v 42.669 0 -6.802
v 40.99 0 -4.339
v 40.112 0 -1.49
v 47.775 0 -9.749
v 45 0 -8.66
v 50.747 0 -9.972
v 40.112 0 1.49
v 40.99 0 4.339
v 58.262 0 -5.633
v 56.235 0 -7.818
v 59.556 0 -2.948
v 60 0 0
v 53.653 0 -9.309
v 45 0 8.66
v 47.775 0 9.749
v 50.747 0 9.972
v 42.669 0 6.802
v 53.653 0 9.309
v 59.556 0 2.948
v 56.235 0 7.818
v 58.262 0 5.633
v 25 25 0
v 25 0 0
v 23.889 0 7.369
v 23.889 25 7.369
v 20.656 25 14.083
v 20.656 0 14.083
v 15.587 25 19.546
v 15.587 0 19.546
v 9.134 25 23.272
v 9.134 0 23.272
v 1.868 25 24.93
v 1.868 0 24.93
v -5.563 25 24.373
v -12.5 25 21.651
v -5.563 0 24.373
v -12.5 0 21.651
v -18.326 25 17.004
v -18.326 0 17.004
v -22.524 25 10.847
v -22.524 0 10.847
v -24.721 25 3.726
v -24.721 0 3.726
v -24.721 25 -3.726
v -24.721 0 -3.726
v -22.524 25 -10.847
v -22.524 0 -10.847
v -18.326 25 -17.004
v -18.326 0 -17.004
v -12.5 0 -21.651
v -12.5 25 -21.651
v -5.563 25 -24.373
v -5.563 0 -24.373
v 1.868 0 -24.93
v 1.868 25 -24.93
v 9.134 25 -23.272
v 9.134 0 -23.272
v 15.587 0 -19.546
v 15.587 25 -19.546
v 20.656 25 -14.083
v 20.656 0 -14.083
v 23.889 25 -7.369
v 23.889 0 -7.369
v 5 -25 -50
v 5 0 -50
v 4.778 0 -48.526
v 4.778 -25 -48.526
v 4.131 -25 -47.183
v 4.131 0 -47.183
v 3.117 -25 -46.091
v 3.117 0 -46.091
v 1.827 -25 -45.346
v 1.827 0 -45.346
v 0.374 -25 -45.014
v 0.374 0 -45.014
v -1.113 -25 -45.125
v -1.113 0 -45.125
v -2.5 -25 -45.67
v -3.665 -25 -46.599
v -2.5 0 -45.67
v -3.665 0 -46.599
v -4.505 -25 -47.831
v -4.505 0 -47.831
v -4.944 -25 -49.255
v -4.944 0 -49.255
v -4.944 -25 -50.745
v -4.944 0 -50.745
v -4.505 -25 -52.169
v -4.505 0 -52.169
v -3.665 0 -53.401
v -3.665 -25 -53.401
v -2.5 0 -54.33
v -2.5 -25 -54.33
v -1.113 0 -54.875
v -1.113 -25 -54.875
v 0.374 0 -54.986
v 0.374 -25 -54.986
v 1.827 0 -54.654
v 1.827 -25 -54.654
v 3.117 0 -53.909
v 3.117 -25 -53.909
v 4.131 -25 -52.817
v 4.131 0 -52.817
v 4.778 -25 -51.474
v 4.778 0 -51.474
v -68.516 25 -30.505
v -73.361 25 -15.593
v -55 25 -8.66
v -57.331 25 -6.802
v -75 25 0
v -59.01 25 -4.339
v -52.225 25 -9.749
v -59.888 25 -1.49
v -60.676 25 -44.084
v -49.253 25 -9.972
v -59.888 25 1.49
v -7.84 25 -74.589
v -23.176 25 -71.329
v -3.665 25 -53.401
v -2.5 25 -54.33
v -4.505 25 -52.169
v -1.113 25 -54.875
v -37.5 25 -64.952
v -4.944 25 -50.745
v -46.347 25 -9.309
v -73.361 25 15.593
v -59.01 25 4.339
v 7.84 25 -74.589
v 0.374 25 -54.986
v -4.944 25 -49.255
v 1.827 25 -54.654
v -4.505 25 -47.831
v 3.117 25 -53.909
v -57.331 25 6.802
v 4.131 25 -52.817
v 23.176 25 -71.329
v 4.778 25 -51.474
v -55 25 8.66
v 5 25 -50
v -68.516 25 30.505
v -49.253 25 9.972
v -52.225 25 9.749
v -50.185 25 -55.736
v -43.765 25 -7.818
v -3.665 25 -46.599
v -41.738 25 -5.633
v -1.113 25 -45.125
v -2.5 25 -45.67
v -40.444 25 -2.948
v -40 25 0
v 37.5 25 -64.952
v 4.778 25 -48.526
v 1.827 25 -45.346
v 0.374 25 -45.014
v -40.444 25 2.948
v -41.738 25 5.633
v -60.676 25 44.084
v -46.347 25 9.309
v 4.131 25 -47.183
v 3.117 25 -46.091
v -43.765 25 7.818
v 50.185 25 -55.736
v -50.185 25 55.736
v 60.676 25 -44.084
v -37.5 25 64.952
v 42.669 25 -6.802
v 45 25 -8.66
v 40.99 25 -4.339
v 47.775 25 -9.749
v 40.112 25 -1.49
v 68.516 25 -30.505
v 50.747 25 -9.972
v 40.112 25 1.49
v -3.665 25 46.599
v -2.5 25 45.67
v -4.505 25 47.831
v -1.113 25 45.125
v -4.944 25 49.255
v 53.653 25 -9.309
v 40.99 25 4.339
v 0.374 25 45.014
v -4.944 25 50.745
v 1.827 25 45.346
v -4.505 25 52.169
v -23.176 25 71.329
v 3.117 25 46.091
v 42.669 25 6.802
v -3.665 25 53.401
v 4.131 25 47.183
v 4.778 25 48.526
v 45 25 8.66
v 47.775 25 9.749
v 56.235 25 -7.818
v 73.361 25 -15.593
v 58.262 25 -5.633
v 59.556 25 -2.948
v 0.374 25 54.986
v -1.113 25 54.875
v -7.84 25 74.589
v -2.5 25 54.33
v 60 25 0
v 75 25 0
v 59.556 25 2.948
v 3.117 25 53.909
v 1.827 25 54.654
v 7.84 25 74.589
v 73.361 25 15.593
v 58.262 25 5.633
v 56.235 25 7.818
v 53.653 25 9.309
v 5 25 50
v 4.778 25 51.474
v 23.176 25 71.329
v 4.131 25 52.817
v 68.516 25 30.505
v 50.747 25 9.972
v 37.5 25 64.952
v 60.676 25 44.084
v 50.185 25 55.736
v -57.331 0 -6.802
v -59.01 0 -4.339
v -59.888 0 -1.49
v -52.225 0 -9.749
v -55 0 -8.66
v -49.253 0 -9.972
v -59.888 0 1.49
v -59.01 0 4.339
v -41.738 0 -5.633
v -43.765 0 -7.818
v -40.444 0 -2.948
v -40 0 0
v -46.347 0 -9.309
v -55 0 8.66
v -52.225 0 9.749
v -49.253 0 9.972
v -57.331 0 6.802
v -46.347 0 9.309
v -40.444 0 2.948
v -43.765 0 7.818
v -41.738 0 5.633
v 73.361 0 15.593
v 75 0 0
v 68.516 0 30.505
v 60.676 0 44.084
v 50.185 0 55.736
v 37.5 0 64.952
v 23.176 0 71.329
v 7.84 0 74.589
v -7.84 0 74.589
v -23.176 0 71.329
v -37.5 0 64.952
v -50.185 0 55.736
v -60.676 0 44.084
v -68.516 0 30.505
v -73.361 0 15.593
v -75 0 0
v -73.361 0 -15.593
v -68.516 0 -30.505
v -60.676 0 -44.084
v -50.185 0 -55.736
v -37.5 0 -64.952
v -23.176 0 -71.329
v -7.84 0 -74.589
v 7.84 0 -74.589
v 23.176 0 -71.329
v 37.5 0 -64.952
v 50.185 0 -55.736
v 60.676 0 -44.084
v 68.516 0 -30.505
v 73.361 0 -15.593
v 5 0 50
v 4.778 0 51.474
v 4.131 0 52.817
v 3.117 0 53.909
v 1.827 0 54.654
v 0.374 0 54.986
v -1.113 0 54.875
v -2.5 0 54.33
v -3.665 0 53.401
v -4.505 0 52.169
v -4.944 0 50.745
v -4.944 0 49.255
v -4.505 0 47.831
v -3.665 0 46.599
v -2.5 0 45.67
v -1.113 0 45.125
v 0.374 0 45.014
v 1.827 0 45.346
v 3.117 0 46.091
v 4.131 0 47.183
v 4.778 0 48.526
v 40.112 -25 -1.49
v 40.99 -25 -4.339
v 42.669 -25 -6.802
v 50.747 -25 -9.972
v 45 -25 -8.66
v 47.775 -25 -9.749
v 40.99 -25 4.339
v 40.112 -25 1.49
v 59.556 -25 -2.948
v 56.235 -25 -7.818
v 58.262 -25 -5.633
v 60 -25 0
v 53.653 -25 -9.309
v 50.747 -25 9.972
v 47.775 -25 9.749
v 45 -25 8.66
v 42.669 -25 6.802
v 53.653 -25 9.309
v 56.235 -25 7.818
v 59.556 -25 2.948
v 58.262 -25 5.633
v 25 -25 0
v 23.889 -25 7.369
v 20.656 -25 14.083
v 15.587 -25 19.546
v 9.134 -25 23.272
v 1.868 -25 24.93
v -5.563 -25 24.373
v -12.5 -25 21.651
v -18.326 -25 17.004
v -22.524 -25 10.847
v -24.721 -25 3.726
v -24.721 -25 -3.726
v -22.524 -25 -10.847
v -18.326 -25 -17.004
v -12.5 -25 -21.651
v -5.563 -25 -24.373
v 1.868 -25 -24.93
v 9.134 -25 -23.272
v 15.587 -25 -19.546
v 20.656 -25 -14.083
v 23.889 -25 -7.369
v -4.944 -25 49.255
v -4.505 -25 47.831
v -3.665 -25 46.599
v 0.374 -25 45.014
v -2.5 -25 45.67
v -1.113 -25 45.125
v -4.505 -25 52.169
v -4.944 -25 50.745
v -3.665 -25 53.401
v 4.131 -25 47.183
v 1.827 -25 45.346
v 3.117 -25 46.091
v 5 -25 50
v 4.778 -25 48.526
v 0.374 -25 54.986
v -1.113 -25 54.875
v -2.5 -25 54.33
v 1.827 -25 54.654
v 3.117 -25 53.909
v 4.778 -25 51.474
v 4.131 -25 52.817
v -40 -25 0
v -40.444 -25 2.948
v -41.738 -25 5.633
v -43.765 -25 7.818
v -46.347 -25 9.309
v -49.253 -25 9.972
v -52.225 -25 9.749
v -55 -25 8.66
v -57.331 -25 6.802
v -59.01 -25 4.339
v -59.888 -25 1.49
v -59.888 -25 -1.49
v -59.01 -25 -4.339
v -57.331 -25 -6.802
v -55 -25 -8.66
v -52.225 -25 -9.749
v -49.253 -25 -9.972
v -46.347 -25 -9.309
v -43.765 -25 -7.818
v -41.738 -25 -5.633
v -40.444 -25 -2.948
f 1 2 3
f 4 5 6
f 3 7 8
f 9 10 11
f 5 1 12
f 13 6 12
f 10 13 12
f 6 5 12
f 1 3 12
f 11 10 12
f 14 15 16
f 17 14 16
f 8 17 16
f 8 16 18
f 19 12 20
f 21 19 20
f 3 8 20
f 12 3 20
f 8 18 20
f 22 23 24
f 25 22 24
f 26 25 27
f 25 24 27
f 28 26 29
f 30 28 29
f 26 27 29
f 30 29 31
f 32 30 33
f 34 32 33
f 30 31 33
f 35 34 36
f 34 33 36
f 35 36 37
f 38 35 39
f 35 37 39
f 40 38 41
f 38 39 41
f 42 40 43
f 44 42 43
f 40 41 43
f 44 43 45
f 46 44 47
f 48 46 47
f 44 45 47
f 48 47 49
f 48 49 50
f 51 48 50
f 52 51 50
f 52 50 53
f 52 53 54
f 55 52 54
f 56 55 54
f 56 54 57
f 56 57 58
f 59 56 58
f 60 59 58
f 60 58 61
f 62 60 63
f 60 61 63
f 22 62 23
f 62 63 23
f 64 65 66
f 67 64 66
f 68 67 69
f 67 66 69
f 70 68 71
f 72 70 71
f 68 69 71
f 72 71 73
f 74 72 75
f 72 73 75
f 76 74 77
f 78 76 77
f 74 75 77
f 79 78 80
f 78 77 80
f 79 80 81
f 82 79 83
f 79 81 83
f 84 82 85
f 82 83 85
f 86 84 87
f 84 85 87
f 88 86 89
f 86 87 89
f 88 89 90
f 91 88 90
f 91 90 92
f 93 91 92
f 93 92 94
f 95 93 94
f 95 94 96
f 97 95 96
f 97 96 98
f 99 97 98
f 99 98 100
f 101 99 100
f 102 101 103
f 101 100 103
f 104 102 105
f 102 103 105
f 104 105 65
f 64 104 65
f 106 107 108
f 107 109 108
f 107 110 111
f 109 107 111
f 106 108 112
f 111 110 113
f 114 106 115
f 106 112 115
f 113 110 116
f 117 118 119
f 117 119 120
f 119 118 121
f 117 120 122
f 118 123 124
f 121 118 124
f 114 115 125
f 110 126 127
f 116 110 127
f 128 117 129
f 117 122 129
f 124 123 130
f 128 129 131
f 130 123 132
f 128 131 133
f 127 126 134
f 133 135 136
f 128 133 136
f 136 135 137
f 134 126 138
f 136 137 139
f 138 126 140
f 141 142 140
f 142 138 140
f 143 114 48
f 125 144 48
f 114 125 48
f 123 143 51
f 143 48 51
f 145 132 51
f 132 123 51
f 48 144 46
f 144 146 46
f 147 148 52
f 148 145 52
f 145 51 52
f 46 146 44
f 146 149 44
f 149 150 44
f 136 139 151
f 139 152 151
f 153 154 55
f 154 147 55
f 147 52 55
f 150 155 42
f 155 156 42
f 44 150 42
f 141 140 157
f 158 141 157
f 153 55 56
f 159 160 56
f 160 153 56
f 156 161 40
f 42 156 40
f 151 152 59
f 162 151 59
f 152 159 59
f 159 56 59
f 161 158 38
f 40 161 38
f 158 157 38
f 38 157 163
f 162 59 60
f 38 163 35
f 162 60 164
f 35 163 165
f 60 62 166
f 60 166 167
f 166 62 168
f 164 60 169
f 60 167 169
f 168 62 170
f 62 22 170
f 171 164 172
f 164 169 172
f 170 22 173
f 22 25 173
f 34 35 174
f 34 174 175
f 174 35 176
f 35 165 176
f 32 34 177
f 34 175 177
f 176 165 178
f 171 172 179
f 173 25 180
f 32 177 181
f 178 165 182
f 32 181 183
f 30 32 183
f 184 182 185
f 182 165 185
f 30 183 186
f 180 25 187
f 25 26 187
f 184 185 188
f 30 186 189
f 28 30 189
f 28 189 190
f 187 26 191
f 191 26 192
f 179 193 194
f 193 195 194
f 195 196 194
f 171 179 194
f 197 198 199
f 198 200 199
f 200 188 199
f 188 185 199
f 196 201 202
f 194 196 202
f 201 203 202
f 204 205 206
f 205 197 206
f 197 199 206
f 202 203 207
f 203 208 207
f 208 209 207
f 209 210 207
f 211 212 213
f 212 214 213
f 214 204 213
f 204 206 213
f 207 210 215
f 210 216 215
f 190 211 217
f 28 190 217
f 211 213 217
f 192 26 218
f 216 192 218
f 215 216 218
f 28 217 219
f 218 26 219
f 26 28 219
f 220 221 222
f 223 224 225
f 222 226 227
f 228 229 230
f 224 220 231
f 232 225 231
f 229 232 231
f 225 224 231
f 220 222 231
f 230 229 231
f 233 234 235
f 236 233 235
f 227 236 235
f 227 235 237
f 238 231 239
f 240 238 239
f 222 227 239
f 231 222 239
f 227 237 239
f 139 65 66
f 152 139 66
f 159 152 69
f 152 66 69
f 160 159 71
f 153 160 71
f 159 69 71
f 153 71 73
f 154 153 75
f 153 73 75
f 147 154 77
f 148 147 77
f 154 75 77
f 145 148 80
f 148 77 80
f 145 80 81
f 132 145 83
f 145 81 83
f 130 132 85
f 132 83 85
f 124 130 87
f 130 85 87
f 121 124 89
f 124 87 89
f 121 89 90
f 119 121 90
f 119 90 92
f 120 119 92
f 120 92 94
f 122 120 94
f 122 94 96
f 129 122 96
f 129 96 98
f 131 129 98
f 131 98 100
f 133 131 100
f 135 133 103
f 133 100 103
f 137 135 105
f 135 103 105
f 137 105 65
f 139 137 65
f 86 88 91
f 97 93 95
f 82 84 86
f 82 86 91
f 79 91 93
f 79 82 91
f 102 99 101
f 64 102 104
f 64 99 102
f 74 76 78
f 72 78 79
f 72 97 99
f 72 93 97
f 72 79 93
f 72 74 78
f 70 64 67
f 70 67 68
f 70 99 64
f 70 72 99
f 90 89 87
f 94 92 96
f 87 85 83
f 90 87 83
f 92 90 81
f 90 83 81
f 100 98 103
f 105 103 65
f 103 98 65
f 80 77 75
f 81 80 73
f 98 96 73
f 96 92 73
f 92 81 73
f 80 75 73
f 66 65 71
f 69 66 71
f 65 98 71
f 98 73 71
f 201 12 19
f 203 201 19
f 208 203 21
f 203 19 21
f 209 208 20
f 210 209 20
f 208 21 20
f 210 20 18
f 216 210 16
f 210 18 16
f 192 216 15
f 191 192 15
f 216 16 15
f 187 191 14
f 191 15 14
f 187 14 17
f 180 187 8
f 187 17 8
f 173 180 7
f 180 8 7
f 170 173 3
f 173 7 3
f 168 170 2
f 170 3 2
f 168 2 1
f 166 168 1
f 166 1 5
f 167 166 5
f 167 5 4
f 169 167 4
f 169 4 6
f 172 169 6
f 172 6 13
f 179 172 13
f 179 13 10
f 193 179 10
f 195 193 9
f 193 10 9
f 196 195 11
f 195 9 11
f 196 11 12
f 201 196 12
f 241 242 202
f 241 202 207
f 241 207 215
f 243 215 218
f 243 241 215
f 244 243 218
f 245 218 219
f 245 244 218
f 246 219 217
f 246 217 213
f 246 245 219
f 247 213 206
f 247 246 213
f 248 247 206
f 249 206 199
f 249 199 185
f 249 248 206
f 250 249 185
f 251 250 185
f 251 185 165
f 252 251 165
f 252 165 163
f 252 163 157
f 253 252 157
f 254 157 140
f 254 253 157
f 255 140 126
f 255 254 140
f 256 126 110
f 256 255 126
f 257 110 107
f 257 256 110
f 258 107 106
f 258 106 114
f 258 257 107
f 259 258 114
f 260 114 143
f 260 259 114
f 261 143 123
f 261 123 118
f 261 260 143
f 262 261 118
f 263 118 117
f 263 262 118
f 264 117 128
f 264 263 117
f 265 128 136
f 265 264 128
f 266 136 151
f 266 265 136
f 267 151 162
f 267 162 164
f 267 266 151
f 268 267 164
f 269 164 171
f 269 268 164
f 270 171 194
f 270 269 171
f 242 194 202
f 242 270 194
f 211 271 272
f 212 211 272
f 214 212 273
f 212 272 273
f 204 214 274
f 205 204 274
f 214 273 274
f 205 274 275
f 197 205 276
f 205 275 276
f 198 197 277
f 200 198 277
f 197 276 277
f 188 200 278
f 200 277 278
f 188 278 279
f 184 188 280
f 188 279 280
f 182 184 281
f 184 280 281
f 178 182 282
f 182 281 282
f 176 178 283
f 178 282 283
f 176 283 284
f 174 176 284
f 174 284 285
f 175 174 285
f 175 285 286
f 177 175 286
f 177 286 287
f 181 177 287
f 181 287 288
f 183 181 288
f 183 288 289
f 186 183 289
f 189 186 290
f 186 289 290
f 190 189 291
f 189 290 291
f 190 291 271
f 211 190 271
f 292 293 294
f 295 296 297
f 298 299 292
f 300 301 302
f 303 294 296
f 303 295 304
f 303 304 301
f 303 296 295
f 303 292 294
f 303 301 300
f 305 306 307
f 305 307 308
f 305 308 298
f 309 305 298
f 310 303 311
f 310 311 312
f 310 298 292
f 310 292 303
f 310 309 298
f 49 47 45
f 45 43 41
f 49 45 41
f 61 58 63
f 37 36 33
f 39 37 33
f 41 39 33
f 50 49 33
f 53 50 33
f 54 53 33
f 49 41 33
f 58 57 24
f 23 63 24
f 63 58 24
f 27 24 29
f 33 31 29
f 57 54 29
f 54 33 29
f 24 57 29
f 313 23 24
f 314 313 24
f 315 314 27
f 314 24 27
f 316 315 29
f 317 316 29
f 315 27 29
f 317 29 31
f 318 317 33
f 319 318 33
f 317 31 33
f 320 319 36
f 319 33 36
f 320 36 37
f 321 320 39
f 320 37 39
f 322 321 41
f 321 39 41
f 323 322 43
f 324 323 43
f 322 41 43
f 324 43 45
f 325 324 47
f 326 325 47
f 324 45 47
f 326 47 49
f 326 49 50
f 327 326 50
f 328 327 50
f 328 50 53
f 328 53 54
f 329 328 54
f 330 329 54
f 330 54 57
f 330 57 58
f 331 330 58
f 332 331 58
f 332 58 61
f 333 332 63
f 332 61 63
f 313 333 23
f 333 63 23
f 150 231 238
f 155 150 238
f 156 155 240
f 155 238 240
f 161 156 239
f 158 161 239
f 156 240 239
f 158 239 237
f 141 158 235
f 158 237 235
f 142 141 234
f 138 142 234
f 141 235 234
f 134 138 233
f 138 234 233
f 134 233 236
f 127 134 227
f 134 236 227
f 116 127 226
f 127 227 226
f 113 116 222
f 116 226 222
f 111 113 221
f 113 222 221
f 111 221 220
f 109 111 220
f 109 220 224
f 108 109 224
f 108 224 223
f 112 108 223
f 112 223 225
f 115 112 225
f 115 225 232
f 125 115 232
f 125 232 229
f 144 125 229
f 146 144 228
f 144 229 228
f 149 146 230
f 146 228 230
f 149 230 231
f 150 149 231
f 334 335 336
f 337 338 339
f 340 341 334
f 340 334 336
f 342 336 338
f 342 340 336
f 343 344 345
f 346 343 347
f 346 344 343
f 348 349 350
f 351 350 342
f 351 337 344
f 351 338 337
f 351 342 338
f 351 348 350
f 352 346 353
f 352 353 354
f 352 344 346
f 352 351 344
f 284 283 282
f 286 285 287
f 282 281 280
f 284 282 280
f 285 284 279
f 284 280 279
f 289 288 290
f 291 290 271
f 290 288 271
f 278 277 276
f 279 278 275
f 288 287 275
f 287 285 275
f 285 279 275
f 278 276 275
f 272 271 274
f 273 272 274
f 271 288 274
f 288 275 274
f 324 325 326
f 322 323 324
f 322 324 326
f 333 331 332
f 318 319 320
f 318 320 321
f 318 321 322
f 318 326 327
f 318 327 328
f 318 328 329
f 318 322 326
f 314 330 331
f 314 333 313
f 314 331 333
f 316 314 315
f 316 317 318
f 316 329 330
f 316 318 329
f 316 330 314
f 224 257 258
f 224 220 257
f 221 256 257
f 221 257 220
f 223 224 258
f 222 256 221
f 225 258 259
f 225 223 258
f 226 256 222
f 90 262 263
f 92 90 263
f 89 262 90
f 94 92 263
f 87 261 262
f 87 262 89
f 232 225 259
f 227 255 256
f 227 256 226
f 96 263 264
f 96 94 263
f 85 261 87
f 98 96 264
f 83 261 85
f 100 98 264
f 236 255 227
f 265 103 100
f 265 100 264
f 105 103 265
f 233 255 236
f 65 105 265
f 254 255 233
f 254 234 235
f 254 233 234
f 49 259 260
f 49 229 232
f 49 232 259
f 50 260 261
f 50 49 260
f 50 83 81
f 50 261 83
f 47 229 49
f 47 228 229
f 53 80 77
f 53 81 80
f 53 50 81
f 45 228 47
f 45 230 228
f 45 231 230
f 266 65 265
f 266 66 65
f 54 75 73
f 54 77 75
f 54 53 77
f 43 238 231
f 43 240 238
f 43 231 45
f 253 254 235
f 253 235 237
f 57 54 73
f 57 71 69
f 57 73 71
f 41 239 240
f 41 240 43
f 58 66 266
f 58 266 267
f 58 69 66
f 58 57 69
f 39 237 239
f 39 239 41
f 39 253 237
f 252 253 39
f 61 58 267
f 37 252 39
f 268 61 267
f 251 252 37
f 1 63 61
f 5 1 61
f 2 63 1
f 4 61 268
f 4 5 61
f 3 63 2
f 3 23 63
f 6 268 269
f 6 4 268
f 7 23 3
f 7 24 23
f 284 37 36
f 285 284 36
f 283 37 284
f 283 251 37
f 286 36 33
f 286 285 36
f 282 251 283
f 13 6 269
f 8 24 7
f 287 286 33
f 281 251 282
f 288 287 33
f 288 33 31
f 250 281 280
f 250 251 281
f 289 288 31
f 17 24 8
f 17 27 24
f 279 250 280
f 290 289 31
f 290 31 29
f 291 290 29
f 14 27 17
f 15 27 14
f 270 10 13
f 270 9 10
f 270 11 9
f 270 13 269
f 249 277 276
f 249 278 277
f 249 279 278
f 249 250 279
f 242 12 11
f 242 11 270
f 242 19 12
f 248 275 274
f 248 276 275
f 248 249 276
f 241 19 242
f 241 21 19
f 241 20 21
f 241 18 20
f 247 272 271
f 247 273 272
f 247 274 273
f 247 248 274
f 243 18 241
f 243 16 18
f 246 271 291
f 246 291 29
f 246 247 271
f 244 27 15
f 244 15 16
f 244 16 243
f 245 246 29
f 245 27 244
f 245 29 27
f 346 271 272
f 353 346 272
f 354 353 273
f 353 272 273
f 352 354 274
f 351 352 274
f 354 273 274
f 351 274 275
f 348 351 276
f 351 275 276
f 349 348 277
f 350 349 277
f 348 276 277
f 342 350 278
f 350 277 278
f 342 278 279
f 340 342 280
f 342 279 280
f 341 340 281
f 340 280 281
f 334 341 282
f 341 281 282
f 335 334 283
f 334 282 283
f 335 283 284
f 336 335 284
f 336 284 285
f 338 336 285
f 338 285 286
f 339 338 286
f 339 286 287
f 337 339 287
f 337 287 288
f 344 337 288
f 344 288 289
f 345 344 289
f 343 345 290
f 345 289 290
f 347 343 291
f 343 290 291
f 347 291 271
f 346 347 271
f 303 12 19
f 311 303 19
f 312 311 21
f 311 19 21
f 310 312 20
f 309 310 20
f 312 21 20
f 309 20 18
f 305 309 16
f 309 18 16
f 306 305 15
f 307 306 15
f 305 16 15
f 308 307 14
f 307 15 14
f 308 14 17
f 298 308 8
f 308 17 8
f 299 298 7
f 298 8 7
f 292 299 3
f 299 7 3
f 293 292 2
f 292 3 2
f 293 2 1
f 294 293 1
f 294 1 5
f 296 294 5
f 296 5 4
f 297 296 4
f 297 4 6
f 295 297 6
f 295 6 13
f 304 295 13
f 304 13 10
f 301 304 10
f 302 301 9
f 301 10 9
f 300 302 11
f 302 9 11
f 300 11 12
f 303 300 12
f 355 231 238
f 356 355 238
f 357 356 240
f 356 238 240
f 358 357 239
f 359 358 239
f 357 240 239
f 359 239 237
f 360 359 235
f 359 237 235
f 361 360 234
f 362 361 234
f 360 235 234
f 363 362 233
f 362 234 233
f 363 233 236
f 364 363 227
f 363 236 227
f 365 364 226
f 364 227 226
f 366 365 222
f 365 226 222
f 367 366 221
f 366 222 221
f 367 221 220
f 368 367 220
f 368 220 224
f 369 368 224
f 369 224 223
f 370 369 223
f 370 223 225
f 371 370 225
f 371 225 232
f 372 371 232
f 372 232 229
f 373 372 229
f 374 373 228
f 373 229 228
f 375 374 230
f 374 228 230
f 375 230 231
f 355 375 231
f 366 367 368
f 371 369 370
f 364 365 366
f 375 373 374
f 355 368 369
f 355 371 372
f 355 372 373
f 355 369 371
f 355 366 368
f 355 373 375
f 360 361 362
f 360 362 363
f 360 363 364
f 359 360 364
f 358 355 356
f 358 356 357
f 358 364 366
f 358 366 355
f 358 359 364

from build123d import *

# Parameters (mm, degrees)
F0_R     = 10
F0_R_2   = 5
F0_R_3   = 25
F1_DEPTH = 25
F0_R_4   = 75
F2_DEPTH = 25


with BuildPart() as f1:
    # F0 (on Front) → F1 (new body)
    with BuildSketch(Plane.XZ):
        with Locations((-50, 0)):
            Circle(F0_R)
        with Locations((0, 50)):
            Circle(F0_R_2)
        with Locations((50, 0)):
            Circle(F0_R)
        with Locations((0, -50)):
            Circle(F0_R_2)
        Circle(F0_R_3)
    extrude(amount=F1_DEPTH)


with BuildPart() as f2:
    # F0 (on Front) → F2 (new body)
    with BuildSketch(Plane.XZ):
        Circle(F0_R_4)
        with Locations((0, -50)):
            Circle(F0_R_2, mode=Mode.SUBTRACT)
        with Locations((-50, 0)):
            Circle(F0_R, mode=Mode.SUBTRACT)
        Circle(F0_R_3, mode=Mode.SUBTRACT)
        with Locations((50, 0)):
            Circle(F0_R, mode=Mode.SUBTRACT)
        with Locations((0, 50)):
            Circle(F0_R_2, mode=Mode.SUBTRACT)
    extrude(amount=-F2_DEPTH)


solid = Compound([f1.part, f2.part])
